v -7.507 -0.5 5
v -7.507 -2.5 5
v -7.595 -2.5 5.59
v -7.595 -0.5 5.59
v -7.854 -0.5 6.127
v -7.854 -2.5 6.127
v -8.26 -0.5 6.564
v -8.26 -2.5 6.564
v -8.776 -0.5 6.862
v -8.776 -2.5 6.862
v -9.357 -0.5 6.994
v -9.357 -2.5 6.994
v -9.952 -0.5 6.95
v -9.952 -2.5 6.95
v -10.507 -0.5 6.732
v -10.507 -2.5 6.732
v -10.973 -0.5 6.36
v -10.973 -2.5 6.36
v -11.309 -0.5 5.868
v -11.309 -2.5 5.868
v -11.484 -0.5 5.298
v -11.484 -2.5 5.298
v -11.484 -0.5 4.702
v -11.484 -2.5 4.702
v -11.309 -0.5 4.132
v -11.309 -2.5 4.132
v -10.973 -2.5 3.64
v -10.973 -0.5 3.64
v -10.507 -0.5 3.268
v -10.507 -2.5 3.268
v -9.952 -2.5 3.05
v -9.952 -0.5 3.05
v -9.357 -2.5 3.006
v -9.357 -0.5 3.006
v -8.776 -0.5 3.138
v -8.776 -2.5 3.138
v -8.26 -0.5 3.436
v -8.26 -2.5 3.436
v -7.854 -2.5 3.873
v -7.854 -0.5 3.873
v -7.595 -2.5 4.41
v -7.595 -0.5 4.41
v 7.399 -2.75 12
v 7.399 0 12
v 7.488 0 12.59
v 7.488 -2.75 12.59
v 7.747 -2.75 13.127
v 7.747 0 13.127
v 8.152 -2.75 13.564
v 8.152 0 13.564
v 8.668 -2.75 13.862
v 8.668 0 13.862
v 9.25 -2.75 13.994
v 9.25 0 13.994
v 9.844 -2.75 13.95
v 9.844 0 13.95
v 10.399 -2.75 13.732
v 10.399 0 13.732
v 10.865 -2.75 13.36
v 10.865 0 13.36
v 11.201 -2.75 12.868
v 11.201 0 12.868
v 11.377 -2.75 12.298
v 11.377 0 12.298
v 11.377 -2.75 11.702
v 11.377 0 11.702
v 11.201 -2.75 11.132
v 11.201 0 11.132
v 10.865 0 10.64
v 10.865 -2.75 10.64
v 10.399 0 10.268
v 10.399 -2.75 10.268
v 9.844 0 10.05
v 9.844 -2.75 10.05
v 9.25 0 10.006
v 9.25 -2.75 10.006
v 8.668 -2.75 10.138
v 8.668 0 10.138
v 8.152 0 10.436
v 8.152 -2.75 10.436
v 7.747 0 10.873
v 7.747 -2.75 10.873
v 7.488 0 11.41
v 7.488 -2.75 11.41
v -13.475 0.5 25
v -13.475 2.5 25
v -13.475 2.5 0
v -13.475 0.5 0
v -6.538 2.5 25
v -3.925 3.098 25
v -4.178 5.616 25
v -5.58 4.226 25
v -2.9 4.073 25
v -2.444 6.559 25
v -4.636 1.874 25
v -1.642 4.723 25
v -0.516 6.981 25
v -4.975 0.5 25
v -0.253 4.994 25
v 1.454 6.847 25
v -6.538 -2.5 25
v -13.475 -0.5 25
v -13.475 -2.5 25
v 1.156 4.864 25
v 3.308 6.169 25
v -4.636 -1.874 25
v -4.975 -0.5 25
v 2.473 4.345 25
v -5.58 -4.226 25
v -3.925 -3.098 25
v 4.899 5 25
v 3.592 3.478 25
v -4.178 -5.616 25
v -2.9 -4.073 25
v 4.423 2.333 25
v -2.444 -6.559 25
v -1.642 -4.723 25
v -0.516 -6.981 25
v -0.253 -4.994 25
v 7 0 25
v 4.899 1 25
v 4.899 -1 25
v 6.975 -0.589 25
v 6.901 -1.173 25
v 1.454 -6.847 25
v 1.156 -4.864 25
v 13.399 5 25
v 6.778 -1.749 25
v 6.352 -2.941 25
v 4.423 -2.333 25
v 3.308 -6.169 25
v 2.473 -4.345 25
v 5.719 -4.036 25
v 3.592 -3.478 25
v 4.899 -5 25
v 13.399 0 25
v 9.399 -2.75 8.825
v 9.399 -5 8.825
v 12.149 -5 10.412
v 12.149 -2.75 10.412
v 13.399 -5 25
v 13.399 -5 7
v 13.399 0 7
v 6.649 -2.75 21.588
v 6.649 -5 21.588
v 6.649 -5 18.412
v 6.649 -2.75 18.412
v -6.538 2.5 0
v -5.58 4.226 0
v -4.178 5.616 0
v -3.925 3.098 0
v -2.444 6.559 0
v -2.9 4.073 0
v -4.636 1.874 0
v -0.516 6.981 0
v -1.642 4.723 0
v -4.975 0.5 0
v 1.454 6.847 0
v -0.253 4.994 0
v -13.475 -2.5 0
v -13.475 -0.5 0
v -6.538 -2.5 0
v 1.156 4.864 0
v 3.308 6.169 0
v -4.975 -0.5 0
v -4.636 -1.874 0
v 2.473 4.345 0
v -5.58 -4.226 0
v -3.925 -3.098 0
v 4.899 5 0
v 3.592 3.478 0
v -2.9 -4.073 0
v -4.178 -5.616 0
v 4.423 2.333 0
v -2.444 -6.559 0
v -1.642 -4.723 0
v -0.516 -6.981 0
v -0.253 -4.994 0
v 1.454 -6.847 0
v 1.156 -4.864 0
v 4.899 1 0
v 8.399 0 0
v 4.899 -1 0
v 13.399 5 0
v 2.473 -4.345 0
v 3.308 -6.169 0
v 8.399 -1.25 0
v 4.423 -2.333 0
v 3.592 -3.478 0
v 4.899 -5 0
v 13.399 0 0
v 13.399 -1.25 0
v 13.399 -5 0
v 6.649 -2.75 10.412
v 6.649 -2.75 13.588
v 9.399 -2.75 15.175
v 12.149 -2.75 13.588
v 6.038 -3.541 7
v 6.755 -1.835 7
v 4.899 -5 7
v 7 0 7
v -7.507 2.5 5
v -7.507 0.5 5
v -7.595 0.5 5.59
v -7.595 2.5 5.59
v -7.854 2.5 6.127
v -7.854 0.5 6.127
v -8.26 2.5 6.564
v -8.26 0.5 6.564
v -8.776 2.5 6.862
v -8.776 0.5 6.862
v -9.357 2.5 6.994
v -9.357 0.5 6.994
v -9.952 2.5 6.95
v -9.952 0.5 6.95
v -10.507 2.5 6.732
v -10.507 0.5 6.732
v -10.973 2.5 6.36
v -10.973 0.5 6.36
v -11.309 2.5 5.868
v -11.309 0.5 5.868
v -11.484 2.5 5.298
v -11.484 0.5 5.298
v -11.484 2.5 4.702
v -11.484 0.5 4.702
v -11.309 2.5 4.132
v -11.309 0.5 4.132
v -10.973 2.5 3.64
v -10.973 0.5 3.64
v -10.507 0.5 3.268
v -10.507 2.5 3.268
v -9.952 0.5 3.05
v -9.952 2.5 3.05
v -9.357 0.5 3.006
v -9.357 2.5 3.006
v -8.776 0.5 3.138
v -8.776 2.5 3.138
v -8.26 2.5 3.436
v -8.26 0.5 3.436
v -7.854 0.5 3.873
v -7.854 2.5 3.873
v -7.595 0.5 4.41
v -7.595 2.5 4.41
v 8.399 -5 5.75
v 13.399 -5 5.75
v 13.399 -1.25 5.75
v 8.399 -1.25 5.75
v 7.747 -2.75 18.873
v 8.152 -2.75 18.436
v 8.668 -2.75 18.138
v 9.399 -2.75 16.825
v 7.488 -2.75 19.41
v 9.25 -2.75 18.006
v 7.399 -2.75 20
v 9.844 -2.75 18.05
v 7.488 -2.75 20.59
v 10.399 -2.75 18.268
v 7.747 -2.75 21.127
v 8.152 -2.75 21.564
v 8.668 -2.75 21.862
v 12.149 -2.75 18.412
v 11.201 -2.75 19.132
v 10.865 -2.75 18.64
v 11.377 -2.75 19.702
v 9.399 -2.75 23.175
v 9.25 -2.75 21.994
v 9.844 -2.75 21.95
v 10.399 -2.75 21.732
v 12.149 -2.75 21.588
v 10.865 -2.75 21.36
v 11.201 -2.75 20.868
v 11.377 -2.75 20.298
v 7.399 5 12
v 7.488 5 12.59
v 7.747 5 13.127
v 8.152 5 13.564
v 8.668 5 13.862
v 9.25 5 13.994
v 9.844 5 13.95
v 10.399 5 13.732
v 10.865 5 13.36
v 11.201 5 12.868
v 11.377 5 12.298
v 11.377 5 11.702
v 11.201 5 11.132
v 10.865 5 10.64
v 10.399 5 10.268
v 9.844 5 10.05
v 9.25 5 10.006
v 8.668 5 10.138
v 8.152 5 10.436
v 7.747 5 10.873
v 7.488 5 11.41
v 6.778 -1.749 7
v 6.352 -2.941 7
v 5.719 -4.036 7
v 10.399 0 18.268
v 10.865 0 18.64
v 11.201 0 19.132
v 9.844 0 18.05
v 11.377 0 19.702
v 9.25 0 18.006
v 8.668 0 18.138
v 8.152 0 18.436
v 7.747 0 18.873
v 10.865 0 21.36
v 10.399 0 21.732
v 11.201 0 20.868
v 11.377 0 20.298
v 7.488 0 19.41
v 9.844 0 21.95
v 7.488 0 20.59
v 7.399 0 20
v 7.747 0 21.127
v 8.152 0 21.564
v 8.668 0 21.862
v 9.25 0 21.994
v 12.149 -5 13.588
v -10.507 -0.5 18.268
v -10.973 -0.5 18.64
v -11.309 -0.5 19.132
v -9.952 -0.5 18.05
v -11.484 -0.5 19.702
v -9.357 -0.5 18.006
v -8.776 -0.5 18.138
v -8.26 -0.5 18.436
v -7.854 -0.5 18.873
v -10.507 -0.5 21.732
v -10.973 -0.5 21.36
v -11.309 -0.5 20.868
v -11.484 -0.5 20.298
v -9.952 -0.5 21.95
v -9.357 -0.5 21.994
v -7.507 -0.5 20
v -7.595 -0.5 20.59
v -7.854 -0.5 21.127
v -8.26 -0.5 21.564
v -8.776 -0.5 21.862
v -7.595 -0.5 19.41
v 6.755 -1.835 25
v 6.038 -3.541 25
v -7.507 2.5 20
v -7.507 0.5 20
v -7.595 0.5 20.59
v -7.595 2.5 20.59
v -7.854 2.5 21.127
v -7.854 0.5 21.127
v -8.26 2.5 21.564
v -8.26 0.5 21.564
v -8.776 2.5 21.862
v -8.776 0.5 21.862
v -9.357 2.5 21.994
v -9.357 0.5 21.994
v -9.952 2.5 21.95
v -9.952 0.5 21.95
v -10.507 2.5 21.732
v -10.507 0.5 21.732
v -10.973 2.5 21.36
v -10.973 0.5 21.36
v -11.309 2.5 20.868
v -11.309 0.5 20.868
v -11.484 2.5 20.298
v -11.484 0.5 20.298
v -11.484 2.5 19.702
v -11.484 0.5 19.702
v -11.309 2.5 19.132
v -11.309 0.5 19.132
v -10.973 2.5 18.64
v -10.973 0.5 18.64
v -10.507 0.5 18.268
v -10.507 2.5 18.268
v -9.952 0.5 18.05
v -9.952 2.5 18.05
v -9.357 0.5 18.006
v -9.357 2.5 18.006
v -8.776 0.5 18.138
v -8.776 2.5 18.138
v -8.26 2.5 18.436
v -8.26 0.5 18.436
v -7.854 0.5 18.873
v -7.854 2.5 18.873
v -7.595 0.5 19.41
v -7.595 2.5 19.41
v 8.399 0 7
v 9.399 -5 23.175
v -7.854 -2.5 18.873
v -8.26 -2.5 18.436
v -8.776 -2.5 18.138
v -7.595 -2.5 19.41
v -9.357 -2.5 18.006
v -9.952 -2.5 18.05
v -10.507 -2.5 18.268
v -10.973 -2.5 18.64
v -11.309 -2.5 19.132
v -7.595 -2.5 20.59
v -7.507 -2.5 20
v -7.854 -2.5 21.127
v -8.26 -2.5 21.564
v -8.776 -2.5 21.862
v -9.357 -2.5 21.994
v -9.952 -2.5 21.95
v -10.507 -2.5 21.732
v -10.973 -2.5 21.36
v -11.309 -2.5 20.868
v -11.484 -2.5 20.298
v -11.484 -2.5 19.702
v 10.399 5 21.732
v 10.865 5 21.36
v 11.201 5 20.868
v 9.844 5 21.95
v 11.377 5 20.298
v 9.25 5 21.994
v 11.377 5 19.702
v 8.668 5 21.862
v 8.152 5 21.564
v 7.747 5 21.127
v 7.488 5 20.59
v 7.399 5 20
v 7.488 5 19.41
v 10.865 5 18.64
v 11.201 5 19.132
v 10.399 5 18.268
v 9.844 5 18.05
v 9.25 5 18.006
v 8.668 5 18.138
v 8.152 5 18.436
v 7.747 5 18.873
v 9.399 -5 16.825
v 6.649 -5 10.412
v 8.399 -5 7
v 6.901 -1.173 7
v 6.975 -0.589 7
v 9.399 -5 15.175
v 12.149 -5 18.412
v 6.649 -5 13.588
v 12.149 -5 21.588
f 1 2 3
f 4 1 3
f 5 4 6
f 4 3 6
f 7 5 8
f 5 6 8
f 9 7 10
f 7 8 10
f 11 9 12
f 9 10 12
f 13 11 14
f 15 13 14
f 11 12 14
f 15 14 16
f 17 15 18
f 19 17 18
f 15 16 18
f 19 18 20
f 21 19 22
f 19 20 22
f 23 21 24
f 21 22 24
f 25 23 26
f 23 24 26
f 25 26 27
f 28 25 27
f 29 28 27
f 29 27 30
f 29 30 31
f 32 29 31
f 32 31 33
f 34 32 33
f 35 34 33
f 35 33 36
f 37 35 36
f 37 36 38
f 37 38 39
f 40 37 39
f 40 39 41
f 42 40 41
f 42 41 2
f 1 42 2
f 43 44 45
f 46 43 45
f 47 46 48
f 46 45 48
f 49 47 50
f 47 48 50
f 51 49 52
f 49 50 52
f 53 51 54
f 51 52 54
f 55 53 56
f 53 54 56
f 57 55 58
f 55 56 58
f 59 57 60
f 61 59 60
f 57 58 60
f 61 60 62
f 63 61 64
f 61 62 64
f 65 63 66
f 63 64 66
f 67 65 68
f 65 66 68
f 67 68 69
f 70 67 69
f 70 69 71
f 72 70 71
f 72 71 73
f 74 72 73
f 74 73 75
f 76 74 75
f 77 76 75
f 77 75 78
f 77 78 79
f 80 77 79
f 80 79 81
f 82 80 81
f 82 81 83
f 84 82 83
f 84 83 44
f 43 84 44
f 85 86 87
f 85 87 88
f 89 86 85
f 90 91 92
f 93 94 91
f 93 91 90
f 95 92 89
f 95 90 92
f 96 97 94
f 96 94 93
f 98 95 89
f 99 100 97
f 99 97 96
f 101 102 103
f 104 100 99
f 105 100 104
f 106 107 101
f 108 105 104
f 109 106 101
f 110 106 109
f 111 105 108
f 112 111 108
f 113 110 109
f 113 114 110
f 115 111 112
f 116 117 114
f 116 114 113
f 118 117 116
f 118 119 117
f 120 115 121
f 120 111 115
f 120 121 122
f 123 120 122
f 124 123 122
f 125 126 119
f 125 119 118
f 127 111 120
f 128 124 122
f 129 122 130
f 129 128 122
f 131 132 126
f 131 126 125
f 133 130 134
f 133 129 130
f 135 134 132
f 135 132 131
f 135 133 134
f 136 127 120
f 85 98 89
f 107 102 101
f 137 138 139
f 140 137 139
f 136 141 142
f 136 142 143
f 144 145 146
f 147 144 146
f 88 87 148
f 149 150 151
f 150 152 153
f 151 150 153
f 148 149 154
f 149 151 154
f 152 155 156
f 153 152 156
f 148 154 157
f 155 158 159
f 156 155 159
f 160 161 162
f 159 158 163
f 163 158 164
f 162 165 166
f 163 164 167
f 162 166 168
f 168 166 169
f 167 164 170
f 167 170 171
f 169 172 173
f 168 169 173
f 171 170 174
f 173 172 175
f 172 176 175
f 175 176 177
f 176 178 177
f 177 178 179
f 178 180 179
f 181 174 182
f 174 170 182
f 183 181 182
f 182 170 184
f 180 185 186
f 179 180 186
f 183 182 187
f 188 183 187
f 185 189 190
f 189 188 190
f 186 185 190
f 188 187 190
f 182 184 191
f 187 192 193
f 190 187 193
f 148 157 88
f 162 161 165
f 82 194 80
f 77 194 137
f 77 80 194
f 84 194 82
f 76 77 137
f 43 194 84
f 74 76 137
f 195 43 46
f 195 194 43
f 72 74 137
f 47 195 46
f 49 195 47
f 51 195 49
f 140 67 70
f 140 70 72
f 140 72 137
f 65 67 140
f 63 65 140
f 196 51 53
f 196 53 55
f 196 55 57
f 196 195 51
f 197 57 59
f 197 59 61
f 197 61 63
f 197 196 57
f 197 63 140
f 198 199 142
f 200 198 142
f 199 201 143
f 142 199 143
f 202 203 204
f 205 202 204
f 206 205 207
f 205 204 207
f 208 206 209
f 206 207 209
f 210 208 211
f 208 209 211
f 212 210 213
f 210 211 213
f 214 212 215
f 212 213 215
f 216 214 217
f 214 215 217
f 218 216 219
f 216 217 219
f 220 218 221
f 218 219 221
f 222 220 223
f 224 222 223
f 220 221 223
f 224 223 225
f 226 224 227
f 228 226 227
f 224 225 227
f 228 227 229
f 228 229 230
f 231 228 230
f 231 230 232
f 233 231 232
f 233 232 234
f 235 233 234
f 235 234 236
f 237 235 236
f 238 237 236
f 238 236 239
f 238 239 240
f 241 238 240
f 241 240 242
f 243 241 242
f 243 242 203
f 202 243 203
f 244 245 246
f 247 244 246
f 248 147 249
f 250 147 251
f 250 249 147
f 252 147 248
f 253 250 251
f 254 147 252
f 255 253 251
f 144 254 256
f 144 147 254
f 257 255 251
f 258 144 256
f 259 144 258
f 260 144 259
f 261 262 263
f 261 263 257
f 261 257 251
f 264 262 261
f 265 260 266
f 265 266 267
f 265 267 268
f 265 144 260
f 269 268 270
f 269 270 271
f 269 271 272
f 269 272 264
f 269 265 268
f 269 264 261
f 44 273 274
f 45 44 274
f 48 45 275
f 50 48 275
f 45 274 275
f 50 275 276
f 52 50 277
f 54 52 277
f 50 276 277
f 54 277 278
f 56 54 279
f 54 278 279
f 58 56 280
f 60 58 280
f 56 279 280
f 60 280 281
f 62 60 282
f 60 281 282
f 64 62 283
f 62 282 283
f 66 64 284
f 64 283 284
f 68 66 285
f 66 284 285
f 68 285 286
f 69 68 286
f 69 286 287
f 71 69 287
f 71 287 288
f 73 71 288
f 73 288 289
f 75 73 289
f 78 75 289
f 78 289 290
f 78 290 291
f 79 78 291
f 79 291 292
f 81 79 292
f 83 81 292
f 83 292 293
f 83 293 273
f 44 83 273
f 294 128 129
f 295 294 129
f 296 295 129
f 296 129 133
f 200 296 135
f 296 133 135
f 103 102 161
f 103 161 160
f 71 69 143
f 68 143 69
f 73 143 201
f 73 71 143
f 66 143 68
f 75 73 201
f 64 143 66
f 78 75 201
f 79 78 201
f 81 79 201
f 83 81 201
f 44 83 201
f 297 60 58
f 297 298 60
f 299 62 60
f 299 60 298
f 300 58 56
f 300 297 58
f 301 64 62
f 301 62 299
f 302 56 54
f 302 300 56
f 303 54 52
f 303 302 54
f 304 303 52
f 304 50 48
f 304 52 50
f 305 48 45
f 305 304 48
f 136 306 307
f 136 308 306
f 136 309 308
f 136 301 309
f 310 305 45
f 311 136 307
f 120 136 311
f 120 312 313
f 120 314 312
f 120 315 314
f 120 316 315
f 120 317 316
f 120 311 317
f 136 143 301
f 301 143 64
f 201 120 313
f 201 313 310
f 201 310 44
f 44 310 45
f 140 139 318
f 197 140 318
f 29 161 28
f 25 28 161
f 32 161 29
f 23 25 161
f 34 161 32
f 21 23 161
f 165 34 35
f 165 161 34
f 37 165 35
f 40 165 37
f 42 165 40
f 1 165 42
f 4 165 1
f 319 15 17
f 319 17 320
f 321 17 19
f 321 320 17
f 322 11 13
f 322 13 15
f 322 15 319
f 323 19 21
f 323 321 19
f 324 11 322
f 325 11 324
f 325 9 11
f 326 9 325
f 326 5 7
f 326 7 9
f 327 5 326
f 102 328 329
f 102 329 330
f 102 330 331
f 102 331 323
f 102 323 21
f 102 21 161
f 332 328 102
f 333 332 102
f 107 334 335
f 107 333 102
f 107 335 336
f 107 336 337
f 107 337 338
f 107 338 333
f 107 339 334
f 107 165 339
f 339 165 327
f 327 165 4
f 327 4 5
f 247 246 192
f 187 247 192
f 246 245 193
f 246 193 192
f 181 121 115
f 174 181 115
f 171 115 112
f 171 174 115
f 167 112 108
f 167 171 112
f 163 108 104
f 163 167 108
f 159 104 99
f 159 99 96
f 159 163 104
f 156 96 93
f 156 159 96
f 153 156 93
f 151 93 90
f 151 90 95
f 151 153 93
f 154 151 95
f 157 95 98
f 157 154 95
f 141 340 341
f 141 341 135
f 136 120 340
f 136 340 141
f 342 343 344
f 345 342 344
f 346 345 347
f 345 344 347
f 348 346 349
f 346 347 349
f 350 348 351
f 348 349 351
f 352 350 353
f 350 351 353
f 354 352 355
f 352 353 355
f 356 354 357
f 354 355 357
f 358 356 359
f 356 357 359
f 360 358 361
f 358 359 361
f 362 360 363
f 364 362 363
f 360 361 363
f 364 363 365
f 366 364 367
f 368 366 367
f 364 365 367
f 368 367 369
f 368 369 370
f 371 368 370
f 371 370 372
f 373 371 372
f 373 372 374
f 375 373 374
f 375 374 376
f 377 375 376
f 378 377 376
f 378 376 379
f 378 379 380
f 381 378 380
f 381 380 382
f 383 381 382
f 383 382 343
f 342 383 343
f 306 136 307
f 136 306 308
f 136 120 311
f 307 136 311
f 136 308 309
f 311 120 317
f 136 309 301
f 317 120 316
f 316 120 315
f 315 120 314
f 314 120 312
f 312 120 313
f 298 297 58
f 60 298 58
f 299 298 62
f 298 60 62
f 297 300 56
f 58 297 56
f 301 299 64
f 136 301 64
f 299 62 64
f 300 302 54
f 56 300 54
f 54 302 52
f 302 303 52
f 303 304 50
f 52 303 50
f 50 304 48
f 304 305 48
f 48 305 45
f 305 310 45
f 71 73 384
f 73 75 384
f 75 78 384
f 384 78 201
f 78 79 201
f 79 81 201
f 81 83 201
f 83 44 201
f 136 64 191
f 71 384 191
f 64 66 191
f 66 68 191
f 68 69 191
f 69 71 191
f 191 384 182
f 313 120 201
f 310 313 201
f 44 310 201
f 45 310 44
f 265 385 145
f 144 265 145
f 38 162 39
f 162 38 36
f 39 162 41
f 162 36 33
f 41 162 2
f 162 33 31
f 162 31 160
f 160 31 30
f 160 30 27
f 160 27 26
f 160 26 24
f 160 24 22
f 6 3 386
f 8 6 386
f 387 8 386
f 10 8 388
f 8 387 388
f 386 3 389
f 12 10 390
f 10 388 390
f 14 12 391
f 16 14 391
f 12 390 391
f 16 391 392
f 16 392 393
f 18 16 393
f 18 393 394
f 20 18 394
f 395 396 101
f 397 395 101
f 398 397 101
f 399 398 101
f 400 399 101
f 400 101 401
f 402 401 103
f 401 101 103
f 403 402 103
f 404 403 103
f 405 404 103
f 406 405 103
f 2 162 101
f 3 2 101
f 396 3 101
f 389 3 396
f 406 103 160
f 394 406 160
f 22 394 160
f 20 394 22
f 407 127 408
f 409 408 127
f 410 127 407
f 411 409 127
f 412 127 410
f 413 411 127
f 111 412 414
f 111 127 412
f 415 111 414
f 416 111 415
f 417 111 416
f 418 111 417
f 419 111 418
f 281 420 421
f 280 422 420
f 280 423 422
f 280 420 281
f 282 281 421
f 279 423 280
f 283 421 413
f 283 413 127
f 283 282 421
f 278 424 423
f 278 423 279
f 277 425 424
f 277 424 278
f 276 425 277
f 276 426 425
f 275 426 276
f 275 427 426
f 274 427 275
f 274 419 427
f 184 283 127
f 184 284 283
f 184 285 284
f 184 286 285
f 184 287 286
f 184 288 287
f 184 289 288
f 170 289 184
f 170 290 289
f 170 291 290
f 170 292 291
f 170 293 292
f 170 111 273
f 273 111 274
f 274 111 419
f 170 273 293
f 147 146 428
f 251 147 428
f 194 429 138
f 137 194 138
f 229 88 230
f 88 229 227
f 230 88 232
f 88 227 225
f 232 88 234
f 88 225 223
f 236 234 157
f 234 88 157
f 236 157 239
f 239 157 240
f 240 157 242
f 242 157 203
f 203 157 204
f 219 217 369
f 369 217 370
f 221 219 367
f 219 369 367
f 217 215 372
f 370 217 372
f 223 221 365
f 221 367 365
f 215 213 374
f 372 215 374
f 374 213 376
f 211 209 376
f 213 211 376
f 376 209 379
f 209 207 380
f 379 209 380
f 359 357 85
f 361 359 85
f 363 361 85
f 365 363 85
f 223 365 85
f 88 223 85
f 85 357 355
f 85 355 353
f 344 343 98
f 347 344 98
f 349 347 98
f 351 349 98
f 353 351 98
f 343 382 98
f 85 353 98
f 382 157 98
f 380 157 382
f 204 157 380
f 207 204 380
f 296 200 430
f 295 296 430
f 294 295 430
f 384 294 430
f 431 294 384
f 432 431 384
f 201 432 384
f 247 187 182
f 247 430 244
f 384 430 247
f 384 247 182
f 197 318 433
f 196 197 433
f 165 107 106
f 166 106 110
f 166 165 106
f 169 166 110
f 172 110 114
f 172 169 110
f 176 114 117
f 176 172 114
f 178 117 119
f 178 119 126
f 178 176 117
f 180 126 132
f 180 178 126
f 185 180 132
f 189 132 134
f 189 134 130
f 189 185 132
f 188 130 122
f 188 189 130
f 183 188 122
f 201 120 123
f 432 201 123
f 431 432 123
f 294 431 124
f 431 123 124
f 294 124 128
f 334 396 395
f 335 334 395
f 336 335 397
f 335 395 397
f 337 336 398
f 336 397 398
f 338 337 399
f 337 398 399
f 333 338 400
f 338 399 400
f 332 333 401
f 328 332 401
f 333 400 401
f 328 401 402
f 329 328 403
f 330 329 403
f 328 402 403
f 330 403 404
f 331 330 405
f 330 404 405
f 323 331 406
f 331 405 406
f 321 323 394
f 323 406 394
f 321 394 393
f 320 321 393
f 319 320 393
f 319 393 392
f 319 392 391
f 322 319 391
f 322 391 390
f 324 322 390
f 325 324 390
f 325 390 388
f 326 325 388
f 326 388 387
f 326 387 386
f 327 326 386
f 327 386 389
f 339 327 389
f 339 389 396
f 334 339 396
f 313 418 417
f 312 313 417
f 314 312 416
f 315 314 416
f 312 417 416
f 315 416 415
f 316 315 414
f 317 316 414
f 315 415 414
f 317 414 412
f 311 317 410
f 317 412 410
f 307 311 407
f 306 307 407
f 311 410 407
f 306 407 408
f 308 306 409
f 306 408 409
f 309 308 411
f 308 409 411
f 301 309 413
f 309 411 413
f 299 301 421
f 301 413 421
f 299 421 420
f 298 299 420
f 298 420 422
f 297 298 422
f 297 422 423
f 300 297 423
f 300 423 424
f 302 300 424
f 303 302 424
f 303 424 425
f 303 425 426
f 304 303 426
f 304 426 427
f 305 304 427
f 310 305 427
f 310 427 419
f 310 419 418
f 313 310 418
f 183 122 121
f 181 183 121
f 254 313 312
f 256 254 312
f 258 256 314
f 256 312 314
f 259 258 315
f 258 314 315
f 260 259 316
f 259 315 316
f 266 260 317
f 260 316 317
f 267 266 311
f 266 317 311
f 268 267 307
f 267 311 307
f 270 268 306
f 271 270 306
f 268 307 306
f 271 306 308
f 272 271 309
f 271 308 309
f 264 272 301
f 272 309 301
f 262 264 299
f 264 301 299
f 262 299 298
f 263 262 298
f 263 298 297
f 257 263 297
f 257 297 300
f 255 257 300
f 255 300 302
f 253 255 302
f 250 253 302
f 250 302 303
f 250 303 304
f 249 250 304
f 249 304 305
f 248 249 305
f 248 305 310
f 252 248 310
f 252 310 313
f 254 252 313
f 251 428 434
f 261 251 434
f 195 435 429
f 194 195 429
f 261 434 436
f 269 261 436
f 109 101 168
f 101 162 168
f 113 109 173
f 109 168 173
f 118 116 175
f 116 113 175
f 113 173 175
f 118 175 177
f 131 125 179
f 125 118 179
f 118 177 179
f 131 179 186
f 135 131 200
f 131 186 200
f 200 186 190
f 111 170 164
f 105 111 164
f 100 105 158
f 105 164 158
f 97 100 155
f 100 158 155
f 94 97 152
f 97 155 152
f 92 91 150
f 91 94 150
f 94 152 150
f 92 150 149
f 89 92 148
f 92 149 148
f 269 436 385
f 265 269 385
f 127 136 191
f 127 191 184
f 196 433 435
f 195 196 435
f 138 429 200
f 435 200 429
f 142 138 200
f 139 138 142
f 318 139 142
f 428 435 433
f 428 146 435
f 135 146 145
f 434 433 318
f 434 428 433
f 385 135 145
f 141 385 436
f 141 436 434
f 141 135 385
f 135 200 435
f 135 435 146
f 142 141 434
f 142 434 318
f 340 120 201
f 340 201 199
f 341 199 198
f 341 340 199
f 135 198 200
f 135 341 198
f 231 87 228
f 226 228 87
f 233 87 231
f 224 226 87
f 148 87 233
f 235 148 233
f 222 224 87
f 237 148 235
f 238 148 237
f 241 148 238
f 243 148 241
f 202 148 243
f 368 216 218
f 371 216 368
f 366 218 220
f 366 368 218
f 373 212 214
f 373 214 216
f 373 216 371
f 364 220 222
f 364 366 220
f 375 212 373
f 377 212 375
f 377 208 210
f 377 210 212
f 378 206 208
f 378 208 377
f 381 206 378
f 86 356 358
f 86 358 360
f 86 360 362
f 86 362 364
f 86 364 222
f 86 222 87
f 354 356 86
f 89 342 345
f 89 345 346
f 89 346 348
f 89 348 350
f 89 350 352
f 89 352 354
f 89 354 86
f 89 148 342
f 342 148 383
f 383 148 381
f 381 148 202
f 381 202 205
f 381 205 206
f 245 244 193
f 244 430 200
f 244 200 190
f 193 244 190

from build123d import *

# Parameters (mm, degrees)
F0_R       = 7
F0_R_2     = 5
F1_DEPTH   = 25
F2_W       = 1
F2_H       = 25
F3_DEPTH   = 25
F4_W       = 7.5
F4_H       = 25
F5_DEPTH   = 2
F7_W       = 5
F7_H       = 10
F8_DEPTH   = 25
F10_DEPTH  = 18
F11_DEPTH  = 2.5
F13_DEPTH  = 18
F14_DEPTH  = 1
F16_DEPTH  = 5
F17_R      = 2
F18_DEPTH  = 12.001
F19_R      = 2
F20_DEPTH  = 9.501
F22_DEPTH  = 18
F23_R      = 2
F24_DEPTH  = 7.001
F26_DEPTH  = 2.25
F6_FACE2_W = 2
F6_FACE2_H = 25
F5_FACE1_W = 2
F5_FACE1_H = 25
F27_DEPTH  = 1


with BuildPart() as f1:
    # F0 (on Top) → F1 (new body)
    with BuildSketch(Plane.XY):
        Circle(F0_R)
        Circle(F0_R_2, mode=Mode.SUBTRACT)
    extrude(amount=F1_DEPTH)

    # F2 (on Right) → F3 (cut)
    with BuildSketch(Plane.YZ):
        with Locations((0, 12.5)):
            Rectangle(F2_W, F2_H)
    extrude(amount=-F3_DEPTH, mode=Mode.SUBTRACT)

    # F6: F5 across plane


with BuildPart() as f5:
    # F4 (on face) → F5 (new body)
    with BuildSketch(Plane(origin=(0, -0.5, 0), x_dir=(-1, 0, 0), z_dir=(0, 1, 0))):
        with Locations((8.7249371855, 12.5)):
            Rectangle(F4_W, F4_H)
    extrude(amount=-F5_DEPTH)


with BuildPart() as f1_1:
    add(f1.part)
    add(f5.part.mirror(Plane.XZ))

    # F7 (on face) → F8 (join)
    with BuildSketch(Plane.XY.offset(25)):
        with Locations((7.3989794856, 0)):
            Rectangle(F7_W, F7_H)
    extrude(amount=-F8_DEPTH)

    # F9 (on face) → F10 (cut)
    with BuildSketch(Plane.XY.offset(25)):
        with BuildLine():
            ThreePointArc((6.7779471585, -1.7491232995), (6.0605035924, -3.5028982582), (4.8989794856, -5))
            Line((4.8989794856, -5), (9.8989794856, -5))
            Line((9.8989794856, -5), (9.8989794856, 0))
            Line((9.8989794856, 0), (6.7779471585, -1.7491232995))
        make_face()
    extrude(amount=-F10_DEPTH, mode=Mode.SUBTRACT)

    # F11 (add): faces of the model
    f11_faces = [f1_1.faces().sort_by_distance(p)[0] for p in [
        (9.8989794856, 1.40625, 10.53125),
        (9.8989794856, 1.40625, 10.53125),
    ]]
    extrude(f11_faces, amount=F11_DEPTH)

    # F12 (on face) → F13 (cut)
    with BuildSketch(Plane.XY.offset(25)):
        with BuildLine():
            ThreePointArc((7, 0), (6.9442649038, -0.8815809352), (6.7779471585, -1.7491232995))
            Line((6.7779471585, -1.7491232995), (9.8989794856, 0))
            Line((9.8989794856, 0), (7, 0))
        make_face()
    extrude(amount=-F13_DEPTH, mode=Mode.SUBTRACT)

    # F14 (add): a face of the model
    f14_faces = [f1_1.faces().sort_by_distance(p)[0] for p in [
        (12.3989794856, 1.40625, 10.53125),
    ]]
    extrude(f14_faces, amount=F14_DEPTH)

    # F15 (on face) → F16 (cut)
    with BuildSketch(Plane.YZ.offset(13.3989794856)):
        Polygon((-5, 5.75), (-1.25, 5.75), (-1.25, 0), (0, 0), (0, 7), (-5, 7), align=None)
    extrude(amount=-F16_DEPTH, mode=Mode.SUBTRACT)

    # F17 (on face) → F18 (cut, through all)
    with BuildSketch(Plane(origin=(0, 5, 0), x_dir=(-1, 0, 0), z_dir=(0, 1, 0))):
        with Locations((-9.3989794856, 20)):
            Circle(F17_R)
        with Locations((-9.3989794856, 12)):
            Circle(F17_R)
    extrude(amount=-F18_DEPTH, mode=Mode.SUBTRACT)


with BuildPart() as f20_tool:
    # F19 (on face) → F20 (new body, through all)
    with BuildSketch(Plane.XZ.offset(2.5)):
        with Locations((-9.5066428004, 20)):
            Circle(F19_R)
        with Locations((-9.5066428004, 5)):
            Circle(F19_R)
    extrude(amount=-F20_DEPTH)


with BuildPart() as f1_2:
    add(f1_1.part)

    # F20: cut by f20_tool
    add(f20_tool.part, mode=Mode.SUBTRACT)



with BuildPart() as f5_1:
    add(f5.part)

    # F20: cut by f20_tool
    add(f20_tool.part, mode=Mode.SUBTRACT)


with BuildPart() as f22:
    # F21 (on face) → F22 (new body)
    with BuildSketch(Plane.XY.offset(25)):
        with BuildLine():
            Line((13.3989794856, -5), (13.3989794856, 0))
            Line((13.3989794856, 0), (7, 0))
            ThreePointArc((7, 0), (6.4534043883, -2.7117470016), (4.8989794856, -5))
            Line((4.8989794856, -5), (13.3989794856, -5))
        make_face()
    extrude(amount=-F22_DEPTH)

    # F23 (on face) → F24 (cut, through all)
    with BuildSketch(Plane(origin=(0, 0, 0), x_dir=(-1, 0, 0), z_dir=(0, 1, 0))):
        with Locations((-9.3989794856, 20)):
            Circle(F23_R)
        with Locations((-9.3989794856, 12)):
            Circle(F23_R)
    extrude(amount=-F24_DEPTH, mode=Mode.SUBTRACT)

    # F25 (on face) → F26 (cut)
    with BuildSketch(Plane.XZ.offset(5)):
        Polygon((9.3989794856, 23.1754264805), (6.6489794856, 21.5877132403), (6.6489794856, 18.4122867597), (9.3989794856, 16.8245735195), (12.1489794856, 18.4122867597), (12.1489794856, 21.5877132403), align=None)
        Polygon((9.3989794856, 15.1754264805), (6.6489794856, 13.5877132403), (6.6489794856, 10.4122867597), (9.3989794856, 8.8245735195), (12.1489794856, 10.4122867597), (12.1489794856, 13.5877132403), align=None)
    extrude(amount=-F26_DEPTH, mode=Mode.SUBTRACT)


with BuildPart() as f1_3:
    add(f1_2.part)

    add(f5_1.part)  # F27 merges F5
    # F6_face2 (on face) + F5_face1 (on face) → F27 (join)
    with BuildSketch(Plane(origin=(-12.4749371855, 1.5, 12.5), x_dir=(0, -1, 0), z_dir=(-1, 0, 0))):
        Rectangle(F6_FACE2_W, F6_FACE2_H)
    with BuildSketch(Plane(origin=(-12.4749371855, -1.5, 12.5), x_dir=(0, -1, 0), z_dir=(-1, 0, 0))):
        Rectangle(F5_FACE1_W, F5_FACE1_H)
    extrude(amount=F27_DEPTH)


solid = Compound([f22.part, f1_3.part])
